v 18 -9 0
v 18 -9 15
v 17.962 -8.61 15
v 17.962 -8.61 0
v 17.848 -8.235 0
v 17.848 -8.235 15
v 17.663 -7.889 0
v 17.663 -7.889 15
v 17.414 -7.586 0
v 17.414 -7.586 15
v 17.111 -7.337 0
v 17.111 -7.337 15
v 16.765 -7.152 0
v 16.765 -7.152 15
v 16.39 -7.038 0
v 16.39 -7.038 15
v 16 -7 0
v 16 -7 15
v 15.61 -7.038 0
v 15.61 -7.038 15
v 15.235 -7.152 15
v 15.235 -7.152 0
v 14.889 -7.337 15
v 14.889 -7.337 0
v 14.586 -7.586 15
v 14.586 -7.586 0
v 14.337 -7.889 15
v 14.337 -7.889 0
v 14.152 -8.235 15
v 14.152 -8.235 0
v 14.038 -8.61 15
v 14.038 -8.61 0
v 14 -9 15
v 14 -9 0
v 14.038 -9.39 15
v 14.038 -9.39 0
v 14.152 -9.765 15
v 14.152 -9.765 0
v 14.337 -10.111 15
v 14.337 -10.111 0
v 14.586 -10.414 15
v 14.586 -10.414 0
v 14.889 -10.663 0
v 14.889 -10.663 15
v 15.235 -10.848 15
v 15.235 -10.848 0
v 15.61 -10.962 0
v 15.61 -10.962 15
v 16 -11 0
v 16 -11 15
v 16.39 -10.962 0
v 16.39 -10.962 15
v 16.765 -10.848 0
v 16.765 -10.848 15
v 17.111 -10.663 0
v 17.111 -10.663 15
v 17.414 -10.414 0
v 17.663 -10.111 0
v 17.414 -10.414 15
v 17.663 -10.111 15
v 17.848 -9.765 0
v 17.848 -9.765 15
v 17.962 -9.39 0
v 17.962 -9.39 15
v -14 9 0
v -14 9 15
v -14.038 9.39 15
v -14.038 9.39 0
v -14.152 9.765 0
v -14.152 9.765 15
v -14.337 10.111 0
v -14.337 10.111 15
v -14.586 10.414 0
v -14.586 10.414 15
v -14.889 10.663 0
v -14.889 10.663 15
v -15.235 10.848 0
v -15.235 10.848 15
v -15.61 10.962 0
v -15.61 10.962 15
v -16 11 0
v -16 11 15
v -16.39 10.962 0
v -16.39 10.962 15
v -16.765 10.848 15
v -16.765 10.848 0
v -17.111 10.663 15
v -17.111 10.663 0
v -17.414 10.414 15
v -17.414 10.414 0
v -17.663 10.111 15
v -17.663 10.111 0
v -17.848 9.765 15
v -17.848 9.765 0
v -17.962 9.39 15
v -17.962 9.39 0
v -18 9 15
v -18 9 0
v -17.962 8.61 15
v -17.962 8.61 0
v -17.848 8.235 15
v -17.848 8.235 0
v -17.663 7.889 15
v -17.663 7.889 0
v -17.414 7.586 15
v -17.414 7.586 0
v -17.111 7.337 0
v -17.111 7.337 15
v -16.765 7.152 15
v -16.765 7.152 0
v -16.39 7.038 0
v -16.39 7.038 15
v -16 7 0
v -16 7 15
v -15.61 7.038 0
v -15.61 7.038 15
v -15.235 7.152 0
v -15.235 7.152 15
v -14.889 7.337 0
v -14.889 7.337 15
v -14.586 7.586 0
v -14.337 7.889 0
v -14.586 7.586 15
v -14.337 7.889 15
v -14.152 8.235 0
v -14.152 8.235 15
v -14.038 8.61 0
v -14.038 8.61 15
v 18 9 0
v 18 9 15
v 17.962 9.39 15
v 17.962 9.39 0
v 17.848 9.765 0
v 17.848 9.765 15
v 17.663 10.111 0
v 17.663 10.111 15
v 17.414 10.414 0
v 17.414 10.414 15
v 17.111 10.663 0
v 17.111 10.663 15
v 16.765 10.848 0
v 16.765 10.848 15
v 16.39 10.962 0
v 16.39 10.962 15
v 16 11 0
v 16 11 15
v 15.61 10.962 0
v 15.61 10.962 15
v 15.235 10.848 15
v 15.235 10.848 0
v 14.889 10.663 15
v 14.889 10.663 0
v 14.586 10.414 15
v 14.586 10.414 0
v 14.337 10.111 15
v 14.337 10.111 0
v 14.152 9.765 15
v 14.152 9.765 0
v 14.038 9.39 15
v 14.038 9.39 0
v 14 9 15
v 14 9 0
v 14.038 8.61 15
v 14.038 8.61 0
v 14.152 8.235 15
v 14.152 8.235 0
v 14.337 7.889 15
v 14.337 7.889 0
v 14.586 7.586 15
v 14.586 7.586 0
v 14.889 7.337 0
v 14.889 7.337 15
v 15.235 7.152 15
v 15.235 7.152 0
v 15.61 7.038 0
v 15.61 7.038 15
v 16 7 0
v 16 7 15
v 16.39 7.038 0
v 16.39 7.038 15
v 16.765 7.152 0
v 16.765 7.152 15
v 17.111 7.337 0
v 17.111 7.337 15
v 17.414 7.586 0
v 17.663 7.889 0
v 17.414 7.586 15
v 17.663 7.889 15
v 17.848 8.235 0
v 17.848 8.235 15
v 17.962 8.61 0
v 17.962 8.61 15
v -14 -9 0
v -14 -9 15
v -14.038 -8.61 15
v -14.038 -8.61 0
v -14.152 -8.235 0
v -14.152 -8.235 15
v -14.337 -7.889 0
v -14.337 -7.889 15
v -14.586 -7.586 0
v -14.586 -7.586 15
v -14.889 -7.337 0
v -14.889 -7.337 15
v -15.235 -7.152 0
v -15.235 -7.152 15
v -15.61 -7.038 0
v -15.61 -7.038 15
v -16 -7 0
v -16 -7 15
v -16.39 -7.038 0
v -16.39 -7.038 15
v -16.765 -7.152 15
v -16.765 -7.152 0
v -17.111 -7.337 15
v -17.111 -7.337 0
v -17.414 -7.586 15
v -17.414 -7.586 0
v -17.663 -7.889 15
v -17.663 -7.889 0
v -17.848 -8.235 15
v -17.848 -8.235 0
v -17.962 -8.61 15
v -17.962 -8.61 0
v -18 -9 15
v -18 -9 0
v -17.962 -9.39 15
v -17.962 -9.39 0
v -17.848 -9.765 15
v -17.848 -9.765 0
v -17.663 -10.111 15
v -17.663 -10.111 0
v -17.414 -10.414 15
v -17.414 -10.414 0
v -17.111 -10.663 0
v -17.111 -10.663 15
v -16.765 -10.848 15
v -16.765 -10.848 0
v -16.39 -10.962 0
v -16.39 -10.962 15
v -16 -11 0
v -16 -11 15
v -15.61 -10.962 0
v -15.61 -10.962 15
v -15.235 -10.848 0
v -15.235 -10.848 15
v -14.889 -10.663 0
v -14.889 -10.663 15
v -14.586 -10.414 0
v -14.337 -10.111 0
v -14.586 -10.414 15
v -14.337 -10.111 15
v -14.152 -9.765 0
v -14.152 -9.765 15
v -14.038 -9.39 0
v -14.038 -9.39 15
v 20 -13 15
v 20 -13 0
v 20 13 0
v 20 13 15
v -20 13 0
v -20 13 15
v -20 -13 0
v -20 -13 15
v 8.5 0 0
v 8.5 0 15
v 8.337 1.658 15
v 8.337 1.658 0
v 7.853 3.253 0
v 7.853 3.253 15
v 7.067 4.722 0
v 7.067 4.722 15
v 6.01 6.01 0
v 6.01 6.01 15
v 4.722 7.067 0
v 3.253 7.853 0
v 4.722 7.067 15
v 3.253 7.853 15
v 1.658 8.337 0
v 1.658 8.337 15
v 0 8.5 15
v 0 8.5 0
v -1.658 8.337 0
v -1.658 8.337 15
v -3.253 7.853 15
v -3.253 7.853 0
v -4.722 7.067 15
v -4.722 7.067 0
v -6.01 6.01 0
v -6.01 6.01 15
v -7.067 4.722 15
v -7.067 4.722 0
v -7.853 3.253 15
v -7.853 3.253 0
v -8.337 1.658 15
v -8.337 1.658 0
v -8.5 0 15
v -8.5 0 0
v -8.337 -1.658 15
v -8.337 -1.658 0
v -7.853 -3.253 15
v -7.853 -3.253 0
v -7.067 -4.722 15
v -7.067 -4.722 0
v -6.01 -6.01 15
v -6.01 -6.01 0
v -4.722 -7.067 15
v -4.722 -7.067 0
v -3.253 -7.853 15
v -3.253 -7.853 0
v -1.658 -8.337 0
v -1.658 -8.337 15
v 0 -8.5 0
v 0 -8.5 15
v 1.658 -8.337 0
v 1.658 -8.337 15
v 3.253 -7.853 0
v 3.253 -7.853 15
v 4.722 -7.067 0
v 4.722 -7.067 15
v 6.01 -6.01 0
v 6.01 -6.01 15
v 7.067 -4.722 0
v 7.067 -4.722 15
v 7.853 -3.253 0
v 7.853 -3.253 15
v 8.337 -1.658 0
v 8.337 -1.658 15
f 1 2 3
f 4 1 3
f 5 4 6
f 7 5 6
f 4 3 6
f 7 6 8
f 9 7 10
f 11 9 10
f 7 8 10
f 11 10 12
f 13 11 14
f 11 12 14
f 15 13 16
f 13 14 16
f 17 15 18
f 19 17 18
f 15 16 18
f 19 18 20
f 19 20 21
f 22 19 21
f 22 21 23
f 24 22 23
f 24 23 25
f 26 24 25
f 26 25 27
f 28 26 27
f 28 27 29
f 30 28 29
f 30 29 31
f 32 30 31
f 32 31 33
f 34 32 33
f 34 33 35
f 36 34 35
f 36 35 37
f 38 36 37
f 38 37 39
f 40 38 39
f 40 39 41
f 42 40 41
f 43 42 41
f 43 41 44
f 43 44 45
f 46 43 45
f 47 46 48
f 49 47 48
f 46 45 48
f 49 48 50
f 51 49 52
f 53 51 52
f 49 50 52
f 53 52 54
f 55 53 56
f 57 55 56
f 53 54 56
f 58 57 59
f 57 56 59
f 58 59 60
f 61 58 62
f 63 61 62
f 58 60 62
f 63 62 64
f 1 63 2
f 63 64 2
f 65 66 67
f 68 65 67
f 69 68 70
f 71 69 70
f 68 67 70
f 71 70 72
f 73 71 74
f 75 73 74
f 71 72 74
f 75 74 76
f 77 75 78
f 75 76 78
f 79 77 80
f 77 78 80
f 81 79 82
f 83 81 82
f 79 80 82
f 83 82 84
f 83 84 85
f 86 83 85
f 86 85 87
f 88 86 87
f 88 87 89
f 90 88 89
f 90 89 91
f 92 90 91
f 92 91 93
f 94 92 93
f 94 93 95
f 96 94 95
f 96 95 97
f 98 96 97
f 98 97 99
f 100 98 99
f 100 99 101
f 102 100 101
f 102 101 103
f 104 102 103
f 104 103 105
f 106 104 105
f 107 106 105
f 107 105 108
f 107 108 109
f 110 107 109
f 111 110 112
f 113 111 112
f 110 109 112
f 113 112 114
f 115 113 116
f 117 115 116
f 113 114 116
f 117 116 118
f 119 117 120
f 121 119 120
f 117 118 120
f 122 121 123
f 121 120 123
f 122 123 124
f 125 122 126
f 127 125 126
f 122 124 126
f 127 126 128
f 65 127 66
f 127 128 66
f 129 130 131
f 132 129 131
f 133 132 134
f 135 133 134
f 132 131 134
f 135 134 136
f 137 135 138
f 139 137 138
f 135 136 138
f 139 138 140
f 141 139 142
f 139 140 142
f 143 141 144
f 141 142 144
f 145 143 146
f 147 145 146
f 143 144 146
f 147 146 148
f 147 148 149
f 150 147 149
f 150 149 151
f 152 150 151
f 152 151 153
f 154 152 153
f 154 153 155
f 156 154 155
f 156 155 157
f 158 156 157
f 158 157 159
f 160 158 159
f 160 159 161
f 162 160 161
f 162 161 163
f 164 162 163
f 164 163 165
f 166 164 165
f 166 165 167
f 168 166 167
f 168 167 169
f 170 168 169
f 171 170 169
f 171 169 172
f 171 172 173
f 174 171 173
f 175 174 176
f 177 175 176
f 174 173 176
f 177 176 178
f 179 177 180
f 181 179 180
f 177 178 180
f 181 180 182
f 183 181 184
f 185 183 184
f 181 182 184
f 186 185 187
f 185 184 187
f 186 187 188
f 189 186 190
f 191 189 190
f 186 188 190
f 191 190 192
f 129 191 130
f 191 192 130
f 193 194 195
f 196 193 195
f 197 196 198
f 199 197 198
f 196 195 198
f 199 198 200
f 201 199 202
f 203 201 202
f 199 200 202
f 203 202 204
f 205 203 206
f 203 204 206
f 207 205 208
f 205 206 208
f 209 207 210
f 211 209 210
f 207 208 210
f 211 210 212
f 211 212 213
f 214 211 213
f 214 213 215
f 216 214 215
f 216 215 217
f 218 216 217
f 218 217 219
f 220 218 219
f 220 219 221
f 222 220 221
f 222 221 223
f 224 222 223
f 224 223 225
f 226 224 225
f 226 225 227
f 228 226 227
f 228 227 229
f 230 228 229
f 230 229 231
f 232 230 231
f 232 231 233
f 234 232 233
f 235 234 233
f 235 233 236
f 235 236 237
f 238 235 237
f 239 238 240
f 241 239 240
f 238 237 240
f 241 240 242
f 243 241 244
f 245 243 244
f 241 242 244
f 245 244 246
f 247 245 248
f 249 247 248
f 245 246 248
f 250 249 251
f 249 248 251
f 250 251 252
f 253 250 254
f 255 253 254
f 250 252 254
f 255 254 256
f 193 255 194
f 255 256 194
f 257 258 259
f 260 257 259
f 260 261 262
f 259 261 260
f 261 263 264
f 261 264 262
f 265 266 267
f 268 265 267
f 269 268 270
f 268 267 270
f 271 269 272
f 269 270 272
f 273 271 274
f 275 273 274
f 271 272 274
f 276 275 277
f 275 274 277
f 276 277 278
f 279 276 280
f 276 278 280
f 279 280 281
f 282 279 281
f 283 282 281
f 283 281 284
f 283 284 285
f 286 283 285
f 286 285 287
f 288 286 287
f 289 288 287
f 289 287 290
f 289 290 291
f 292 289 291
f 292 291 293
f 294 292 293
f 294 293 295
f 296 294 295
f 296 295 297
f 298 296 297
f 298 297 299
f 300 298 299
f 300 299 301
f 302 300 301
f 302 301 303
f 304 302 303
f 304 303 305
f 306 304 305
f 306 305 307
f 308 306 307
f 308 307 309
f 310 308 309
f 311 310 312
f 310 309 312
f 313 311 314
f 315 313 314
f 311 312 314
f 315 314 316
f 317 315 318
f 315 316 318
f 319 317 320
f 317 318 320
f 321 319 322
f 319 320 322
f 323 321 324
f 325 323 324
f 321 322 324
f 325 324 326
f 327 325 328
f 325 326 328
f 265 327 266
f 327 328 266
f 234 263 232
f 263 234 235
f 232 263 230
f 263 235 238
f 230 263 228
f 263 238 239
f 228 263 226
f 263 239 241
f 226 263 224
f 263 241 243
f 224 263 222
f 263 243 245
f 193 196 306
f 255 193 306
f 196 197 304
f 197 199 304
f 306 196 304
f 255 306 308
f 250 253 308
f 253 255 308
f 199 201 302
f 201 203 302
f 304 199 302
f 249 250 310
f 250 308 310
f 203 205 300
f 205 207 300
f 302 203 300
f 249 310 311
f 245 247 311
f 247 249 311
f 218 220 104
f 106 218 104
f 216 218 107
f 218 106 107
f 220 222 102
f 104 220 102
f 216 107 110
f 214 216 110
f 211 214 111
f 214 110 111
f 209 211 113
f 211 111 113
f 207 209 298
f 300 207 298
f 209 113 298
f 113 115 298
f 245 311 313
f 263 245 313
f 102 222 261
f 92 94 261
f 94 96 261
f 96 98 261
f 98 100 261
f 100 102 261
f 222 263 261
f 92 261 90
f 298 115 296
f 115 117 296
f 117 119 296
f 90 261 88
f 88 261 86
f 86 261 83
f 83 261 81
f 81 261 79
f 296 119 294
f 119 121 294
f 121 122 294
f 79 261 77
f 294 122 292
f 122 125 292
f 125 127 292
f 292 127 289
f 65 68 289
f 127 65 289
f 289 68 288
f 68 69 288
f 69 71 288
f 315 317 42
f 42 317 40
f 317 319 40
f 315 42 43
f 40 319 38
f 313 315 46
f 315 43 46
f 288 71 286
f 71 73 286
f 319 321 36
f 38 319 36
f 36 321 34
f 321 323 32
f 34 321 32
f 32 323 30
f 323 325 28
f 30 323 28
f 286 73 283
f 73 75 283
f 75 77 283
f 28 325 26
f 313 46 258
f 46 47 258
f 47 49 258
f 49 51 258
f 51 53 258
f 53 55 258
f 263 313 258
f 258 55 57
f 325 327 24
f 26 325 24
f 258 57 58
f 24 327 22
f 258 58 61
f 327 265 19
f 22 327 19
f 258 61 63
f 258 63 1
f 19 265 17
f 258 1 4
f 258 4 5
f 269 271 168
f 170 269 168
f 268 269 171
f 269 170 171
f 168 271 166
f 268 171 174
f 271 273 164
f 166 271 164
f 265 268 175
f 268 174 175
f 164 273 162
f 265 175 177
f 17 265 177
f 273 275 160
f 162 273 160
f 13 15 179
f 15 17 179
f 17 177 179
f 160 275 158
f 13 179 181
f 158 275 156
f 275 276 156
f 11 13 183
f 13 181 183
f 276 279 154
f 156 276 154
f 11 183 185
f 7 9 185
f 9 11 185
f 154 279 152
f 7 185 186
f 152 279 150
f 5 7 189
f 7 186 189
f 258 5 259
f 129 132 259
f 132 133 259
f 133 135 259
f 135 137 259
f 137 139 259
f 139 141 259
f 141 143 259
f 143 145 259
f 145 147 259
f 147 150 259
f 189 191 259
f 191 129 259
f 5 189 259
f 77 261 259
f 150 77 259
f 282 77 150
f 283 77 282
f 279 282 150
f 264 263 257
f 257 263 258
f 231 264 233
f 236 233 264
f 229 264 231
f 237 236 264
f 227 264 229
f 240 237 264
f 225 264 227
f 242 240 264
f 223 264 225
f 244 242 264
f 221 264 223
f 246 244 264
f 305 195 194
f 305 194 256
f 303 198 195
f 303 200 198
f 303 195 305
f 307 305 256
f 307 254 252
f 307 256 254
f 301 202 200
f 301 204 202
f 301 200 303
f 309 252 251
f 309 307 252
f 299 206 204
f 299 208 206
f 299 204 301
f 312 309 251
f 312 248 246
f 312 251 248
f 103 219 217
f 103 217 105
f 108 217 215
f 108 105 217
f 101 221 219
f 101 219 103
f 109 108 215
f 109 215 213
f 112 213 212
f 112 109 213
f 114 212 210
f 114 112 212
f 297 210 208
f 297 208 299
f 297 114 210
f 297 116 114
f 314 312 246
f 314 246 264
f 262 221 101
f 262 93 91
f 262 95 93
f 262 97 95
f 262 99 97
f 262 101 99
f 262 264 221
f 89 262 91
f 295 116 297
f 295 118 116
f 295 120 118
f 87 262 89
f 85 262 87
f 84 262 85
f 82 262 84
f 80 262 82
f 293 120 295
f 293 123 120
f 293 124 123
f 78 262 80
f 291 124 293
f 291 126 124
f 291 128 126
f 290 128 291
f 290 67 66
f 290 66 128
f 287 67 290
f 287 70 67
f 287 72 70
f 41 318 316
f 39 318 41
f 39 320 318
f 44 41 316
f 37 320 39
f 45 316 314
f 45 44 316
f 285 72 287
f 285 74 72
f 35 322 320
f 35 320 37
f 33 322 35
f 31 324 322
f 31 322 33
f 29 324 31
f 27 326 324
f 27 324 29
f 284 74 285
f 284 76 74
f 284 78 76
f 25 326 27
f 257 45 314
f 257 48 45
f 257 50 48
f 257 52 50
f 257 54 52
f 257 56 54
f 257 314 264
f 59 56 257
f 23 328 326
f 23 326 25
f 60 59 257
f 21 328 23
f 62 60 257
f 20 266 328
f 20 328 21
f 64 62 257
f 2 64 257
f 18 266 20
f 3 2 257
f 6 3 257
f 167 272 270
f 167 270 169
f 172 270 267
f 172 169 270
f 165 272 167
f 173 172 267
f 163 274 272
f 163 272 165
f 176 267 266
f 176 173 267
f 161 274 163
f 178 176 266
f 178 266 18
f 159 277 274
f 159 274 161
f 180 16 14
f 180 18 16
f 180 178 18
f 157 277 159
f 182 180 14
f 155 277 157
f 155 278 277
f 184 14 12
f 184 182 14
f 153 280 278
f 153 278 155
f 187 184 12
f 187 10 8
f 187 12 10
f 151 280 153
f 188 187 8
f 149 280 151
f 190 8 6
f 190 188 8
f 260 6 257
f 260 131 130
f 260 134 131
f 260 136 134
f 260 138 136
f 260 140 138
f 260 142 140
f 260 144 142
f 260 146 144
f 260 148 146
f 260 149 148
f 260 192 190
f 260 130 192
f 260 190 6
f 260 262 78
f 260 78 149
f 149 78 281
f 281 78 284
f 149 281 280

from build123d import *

# Parameters (mm, degrees)
F0_W     = 40
F0_H     = 26
F1_DEPTH = 15
F2_R     = 8.5
F2_R_2   = 2
F3_DEPTH = 15.001


with BuildPart() as f1:
    # F0 (on Top) → F1 (new body)
    with BuildSketch(Plane.XY):
        Rectangle(F0_W, F0_H)
    extrude(amount=F1_DEPTH)

    # F2 (on face) → F3 (cut, through all)
    with BuildSketch(Plane.XY.offset(15)):
        Circle(F2_R)
        with Locations((-16, 9)):
            Circle(F2_R_2)
        with Locations((-16, -9)):
            Circle(F2_R_2)
        with Locations((16, 9)):
            Circle(F2_R_2)
        with Locations((16, -9)):
            Circle(F2_R_2)
    extrude(amount=-F3_DEPTH, mode=Mode.SUBTRACT)


solid = f1.part
